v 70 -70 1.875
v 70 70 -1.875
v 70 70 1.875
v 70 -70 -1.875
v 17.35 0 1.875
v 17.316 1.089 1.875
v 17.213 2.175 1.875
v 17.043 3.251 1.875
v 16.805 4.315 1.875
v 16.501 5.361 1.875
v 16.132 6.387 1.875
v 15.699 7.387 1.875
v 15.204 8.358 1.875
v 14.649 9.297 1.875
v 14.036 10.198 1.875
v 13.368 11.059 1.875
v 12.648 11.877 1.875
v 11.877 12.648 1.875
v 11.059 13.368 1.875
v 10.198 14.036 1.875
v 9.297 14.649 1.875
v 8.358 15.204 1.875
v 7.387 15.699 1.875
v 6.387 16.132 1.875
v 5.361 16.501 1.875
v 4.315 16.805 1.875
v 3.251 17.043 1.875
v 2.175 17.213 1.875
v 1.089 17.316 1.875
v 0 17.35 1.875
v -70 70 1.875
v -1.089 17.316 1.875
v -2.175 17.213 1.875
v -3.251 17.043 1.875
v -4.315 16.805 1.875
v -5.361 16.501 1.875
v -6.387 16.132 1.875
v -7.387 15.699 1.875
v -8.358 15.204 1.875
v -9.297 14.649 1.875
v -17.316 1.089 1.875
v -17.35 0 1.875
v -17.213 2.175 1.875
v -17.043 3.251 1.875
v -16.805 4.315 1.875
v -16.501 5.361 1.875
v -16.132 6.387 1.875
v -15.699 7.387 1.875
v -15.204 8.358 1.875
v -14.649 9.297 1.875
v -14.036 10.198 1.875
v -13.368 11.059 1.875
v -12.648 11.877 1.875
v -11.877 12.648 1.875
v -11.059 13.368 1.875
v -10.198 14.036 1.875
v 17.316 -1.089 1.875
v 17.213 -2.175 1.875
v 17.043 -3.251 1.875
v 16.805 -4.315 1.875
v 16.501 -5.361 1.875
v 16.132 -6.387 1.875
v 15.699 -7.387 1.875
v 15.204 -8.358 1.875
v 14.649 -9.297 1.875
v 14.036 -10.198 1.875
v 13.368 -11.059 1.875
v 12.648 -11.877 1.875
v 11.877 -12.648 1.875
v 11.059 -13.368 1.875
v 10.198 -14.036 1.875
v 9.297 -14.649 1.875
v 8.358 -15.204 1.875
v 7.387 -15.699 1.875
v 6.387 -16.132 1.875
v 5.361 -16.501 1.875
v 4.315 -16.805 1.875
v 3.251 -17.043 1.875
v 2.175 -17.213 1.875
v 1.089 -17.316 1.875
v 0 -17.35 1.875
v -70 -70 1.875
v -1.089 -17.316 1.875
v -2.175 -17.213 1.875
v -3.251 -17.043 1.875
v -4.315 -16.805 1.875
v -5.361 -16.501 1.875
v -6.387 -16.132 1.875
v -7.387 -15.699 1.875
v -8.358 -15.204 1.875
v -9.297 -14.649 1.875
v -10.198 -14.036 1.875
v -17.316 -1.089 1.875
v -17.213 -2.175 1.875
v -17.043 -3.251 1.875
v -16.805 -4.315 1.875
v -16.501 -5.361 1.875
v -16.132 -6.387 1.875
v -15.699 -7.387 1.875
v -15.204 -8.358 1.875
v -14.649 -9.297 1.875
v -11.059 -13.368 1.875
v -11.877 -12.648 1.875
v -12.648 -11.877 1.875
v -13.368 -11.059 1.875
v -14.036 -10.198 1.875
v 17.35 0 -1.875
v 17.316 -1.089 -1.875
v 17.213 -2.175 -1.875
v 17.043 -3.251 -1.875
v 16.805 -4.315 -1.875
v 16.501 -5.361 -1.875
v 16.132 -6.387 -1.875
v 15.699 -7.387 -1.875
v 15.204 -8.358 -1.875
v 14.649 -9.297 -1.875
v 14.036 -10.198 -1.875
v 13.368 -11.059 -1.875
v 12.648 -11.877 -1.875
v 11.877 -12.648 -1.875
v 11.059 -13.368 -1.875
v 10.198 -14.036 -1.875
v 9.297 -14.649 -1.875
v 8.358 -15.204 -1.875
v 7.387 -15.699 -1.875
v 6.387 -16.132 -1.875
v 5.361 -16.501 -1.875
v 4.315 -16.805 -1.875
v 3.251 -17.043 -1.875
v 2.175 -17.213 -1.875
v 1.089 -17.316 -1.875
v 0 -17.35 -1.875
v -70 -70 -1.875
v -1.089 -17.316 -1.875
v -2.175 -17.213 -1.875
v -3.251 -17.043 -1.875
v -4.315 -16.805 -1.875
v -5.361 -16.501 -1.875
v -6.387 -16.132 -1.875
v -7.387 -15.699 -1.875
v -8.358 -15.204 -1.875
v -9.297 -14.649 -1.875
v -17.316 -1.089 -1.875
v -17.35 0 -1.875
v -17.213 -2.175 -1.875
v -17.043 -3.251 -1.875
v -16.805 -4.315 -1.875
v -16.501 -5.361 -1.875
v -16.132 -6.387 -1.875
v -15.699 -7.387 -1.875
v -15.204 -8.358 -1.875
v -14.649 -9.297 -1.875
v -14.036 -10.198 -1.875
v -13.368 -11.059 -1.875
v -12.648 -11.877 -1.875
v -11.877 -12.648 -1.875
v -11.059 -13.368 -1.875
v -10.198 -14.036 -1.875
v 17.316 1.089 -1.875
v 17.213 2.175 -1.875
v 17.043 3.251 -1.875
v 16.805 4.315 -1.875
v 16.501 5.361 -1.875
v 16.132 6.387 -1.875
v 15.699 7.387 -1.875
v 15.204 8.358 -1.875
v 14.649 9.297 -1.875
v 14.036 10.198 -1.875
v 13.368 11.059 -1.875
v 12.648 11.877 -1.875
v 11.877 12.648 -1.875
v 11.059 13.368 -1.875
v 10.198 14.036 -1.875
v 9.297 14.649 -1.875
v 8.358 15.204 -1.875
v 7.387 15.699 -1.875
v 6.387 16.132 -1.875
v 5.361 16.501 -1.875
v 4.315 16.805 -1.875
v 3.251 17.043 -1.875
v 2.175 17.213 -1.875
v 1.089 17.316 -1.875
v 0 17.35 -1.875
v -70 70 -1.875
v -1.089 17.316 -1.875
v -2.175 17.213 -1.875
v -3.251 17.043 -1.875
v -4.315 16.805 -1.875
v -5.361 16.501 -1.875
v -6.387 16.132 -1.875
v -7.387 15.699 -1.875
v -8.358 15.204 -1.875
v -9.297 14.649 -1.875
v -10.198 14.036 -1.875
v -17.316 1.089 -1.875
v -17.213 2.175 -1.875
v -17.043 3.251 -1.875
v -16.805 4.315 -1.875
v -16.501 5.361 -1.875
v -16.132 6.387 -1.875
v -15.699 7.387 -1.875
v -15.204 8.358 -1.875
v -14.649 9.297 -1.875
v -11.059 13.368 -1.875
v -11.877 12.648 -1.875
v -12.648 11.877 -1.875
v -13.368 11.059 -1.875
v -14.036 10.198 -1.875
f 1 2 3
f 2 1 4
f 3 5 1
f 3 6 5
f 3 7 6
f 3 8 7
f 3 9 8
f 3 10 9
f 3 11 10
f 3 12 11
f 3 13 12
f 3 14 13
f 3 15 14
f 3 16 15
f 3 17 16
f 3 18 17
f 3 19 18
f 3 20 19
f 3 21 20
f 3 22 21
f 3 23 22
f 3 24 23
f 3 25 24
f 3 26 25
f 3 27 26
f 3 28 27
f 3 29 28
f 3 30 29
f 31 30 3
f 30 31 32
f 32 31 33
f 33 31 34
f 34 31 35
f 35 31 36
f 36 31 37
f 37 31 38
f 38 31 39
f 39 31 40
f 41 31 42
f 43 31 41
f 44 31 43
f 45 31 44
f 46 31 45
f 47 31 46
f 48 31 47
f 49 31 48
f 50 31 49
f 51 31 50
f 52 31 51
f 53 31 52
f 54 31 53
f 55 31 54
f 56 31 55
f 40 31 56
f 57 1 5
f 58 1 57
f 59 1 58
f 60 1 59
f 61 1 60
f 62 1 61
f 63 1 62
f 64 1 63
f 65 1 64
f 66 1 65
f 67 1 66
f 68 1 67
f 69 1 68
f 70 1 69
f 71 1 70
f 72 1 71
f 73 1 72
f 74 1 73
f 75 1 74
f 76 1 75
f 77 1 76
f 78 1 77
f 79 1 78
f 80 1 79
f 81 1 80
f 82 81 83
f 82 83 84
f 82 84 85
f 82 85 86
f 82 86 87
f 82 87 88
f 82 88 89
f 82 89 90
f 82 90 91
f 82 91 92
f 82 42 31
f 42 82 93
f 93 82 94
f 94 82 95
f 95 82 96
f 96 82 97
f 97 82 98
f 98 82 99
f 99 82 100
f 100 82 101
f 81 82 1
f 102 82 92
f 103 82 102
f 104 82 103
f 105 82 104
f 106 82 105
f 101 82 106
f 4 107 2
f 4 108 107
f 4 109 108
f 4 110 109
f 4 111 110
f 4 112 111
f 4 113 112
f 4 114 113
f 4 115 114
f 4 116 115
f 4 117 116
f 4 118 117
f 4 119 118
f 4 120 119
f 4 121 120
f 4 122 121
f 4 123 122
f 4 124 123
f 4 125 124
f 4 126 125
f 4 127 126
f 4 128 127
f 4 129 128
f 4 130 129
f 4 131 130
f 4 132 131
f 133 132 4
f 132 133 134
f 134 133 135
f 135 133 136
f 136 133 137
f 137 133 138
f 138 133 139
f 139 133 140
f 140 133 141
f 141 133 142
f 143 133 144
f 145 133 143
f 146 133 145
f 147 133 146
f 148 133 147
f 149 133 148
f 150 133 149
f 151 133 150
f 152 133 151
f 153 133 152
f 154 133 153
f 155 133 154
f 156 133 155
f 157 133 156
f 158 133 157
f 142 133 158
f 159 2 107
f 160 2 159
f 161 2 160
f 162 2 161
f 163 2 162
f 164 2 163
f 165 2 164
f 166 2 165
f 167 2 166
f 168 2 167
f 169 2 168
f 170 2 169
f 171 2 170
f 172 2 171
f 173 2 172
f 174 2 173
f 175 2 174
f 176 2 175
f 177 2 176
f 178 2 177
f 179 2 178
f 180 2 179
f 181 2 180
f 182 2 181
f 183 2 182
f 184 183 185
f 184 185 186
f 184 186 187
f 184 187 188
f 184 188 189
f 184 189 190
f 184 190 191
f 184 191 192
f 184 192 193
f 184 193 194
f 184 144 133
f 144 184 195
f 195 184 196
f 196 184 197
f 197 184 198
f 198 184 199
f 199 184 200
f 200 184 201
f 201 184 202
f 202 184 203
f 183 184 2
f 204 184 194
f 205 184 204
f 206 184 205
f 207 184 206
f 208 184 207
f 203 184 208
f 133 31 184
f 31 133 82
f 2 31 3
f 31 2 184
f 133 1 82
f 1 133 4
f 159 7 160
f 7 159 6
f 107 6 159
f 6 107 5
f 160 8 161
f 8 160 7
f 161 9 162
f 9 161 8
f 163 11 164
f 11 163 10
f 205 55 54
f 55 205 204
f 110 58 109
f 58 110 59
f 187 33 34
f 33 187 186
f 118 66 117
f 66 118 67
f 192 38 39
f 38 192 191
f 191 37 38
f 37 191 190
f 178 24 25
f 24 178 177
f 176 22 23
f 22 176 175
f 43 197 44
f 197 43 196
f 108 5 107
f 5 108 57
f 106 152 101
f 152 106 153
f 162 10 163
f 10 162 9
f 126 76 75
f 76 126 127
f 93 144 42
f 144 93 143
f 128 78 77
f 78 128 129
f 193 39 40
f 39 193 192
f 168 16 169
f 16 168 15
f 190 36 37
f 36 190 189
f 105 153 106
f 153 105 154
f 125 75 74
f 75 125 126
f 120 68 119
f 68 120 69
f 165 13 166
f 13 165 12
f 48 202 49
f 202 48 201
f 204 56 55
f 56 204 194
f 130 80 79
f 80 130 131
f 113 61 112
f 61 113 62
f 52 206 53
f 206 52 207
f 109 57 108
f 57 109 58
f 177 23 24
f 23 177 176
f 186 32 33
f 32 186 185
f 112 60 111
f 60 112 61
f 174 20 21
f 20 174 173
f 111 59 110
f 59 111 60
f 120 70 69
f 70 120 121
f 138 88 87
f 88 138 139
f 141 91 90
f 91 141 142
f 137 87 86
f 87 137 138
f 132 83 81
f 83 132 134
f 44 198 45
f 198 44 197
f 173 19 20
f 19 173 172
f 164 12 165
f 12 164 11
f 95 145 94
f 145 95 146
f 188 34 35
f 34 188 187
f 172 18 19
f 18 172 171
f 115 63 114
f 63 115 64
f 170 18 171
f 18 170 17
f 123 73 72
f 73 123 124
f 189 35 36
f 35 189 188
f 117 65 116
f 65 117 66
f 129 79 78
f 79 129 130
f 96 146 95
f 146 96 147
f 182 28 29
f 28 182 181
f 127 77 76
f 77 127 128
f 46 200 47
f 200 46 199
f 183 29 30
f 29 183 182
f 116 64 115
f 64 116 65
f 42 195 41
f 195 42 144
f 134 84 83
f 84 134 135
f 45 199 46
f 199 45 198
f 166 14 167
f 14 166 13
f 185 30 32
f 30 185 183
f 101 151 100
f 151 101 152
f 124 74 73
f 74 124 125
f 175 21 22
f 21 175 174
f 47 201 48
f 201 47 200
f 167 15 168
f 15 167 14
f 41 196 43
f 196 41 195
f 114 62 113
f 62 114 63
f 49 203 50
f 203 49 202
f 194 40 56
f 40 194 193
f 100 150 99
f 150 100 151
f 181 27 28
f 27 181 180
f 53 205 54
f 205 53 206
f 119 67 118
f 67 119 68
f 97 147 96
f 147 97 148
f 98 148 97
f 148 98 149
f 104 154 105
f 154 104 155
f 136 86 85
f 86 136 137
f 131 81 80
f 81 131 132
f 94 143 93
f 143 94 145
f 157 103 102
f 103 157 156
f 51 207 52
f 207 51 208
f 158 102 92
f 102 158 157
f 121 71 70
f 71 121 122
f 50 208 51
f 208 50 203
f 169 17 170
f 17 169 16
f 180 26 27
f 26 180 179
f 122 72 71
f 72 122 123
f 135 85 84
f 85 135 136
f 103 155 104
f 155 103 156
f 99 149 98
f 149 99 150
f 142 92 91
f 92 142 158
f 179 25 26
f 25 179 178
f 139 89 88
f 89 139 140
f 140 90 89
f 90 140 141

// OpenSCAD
// file: common/lens-sizes.scad
// Film format lookup table
// Each entry: [format_name, mount_diameter, mount_thickness]
LENS_FORMATS = [
    ["Copal 0", 34.7, 3.75],
    ["Copal 1", 41.8, 3.75],
    ["Copal 3", 65, 4],
    ["Super Large Lens", 95, 4],
];

// Index constants for LENS_FORMATS table
_LF_NAME = 0;
_LF_MOUNT_DIAMETER = 1;
_LF_MOUNT_THICKNESS = 2;

// Core lookup function - returns the format entry or undef if not found
function _find_lens_format(format) =
    let (matches = [for (f = LENS_FORMATS) if (f[_LF_NAME] == format) f]) len(matches) > 0 ? matches[0] : undef;

// Unified function to get all lens format dimensions
// Returns: [mount_diameter, mount_thickness] or undef for unknown format
function get_lens_format(format) =
    let (entry = _find_lens_format(format)) entry != undef ? [entry[_LF_MOUNT_DIAMETER], entry[_LF_MOUNT_THICKNESS]]
    : undef;

// Backward-compatible accessor functions
function get_lens_format_mount_diameter(format) =
    get_lens_format(format)[0];

function get_lens_format_mount_thickness(format) =
    get_lens_format(format)[1];
// main file
include <common/lens-sizes.scad>

/* [Lens Settings] */
// Select lens mount type
Lens_Type = "Copal 0"; // ["Copal 0", "Copal 1", "Copal 3", "Super Large Lens"]

/* [Hidden] */
$fn = 100;
LENS_BOARD_WIDTH_HEIGHT = 140;

// Get lens dimensions from lookup table
_lens_dims = get_lens_format(Lens_Type);
_lens_mount_diameter = _lens_dims[0];
_lens_mount_thickness = _lens_dims[1];

module intrepid_lens_board(mount_diameter, board_thickness) {
    difference() {
        cube([LENS_BOARD_WIDTH_HEIGHT, LENS_BOARD_WIDTH_HEIGHT, board_thickness], center=true);
        cylinder(h=board_thickness + 0.1, d=mount_diameter, center=true);
    }
}

intrepid_lens_board(_lens_mount_diameter, _lens_mount_thickness);
